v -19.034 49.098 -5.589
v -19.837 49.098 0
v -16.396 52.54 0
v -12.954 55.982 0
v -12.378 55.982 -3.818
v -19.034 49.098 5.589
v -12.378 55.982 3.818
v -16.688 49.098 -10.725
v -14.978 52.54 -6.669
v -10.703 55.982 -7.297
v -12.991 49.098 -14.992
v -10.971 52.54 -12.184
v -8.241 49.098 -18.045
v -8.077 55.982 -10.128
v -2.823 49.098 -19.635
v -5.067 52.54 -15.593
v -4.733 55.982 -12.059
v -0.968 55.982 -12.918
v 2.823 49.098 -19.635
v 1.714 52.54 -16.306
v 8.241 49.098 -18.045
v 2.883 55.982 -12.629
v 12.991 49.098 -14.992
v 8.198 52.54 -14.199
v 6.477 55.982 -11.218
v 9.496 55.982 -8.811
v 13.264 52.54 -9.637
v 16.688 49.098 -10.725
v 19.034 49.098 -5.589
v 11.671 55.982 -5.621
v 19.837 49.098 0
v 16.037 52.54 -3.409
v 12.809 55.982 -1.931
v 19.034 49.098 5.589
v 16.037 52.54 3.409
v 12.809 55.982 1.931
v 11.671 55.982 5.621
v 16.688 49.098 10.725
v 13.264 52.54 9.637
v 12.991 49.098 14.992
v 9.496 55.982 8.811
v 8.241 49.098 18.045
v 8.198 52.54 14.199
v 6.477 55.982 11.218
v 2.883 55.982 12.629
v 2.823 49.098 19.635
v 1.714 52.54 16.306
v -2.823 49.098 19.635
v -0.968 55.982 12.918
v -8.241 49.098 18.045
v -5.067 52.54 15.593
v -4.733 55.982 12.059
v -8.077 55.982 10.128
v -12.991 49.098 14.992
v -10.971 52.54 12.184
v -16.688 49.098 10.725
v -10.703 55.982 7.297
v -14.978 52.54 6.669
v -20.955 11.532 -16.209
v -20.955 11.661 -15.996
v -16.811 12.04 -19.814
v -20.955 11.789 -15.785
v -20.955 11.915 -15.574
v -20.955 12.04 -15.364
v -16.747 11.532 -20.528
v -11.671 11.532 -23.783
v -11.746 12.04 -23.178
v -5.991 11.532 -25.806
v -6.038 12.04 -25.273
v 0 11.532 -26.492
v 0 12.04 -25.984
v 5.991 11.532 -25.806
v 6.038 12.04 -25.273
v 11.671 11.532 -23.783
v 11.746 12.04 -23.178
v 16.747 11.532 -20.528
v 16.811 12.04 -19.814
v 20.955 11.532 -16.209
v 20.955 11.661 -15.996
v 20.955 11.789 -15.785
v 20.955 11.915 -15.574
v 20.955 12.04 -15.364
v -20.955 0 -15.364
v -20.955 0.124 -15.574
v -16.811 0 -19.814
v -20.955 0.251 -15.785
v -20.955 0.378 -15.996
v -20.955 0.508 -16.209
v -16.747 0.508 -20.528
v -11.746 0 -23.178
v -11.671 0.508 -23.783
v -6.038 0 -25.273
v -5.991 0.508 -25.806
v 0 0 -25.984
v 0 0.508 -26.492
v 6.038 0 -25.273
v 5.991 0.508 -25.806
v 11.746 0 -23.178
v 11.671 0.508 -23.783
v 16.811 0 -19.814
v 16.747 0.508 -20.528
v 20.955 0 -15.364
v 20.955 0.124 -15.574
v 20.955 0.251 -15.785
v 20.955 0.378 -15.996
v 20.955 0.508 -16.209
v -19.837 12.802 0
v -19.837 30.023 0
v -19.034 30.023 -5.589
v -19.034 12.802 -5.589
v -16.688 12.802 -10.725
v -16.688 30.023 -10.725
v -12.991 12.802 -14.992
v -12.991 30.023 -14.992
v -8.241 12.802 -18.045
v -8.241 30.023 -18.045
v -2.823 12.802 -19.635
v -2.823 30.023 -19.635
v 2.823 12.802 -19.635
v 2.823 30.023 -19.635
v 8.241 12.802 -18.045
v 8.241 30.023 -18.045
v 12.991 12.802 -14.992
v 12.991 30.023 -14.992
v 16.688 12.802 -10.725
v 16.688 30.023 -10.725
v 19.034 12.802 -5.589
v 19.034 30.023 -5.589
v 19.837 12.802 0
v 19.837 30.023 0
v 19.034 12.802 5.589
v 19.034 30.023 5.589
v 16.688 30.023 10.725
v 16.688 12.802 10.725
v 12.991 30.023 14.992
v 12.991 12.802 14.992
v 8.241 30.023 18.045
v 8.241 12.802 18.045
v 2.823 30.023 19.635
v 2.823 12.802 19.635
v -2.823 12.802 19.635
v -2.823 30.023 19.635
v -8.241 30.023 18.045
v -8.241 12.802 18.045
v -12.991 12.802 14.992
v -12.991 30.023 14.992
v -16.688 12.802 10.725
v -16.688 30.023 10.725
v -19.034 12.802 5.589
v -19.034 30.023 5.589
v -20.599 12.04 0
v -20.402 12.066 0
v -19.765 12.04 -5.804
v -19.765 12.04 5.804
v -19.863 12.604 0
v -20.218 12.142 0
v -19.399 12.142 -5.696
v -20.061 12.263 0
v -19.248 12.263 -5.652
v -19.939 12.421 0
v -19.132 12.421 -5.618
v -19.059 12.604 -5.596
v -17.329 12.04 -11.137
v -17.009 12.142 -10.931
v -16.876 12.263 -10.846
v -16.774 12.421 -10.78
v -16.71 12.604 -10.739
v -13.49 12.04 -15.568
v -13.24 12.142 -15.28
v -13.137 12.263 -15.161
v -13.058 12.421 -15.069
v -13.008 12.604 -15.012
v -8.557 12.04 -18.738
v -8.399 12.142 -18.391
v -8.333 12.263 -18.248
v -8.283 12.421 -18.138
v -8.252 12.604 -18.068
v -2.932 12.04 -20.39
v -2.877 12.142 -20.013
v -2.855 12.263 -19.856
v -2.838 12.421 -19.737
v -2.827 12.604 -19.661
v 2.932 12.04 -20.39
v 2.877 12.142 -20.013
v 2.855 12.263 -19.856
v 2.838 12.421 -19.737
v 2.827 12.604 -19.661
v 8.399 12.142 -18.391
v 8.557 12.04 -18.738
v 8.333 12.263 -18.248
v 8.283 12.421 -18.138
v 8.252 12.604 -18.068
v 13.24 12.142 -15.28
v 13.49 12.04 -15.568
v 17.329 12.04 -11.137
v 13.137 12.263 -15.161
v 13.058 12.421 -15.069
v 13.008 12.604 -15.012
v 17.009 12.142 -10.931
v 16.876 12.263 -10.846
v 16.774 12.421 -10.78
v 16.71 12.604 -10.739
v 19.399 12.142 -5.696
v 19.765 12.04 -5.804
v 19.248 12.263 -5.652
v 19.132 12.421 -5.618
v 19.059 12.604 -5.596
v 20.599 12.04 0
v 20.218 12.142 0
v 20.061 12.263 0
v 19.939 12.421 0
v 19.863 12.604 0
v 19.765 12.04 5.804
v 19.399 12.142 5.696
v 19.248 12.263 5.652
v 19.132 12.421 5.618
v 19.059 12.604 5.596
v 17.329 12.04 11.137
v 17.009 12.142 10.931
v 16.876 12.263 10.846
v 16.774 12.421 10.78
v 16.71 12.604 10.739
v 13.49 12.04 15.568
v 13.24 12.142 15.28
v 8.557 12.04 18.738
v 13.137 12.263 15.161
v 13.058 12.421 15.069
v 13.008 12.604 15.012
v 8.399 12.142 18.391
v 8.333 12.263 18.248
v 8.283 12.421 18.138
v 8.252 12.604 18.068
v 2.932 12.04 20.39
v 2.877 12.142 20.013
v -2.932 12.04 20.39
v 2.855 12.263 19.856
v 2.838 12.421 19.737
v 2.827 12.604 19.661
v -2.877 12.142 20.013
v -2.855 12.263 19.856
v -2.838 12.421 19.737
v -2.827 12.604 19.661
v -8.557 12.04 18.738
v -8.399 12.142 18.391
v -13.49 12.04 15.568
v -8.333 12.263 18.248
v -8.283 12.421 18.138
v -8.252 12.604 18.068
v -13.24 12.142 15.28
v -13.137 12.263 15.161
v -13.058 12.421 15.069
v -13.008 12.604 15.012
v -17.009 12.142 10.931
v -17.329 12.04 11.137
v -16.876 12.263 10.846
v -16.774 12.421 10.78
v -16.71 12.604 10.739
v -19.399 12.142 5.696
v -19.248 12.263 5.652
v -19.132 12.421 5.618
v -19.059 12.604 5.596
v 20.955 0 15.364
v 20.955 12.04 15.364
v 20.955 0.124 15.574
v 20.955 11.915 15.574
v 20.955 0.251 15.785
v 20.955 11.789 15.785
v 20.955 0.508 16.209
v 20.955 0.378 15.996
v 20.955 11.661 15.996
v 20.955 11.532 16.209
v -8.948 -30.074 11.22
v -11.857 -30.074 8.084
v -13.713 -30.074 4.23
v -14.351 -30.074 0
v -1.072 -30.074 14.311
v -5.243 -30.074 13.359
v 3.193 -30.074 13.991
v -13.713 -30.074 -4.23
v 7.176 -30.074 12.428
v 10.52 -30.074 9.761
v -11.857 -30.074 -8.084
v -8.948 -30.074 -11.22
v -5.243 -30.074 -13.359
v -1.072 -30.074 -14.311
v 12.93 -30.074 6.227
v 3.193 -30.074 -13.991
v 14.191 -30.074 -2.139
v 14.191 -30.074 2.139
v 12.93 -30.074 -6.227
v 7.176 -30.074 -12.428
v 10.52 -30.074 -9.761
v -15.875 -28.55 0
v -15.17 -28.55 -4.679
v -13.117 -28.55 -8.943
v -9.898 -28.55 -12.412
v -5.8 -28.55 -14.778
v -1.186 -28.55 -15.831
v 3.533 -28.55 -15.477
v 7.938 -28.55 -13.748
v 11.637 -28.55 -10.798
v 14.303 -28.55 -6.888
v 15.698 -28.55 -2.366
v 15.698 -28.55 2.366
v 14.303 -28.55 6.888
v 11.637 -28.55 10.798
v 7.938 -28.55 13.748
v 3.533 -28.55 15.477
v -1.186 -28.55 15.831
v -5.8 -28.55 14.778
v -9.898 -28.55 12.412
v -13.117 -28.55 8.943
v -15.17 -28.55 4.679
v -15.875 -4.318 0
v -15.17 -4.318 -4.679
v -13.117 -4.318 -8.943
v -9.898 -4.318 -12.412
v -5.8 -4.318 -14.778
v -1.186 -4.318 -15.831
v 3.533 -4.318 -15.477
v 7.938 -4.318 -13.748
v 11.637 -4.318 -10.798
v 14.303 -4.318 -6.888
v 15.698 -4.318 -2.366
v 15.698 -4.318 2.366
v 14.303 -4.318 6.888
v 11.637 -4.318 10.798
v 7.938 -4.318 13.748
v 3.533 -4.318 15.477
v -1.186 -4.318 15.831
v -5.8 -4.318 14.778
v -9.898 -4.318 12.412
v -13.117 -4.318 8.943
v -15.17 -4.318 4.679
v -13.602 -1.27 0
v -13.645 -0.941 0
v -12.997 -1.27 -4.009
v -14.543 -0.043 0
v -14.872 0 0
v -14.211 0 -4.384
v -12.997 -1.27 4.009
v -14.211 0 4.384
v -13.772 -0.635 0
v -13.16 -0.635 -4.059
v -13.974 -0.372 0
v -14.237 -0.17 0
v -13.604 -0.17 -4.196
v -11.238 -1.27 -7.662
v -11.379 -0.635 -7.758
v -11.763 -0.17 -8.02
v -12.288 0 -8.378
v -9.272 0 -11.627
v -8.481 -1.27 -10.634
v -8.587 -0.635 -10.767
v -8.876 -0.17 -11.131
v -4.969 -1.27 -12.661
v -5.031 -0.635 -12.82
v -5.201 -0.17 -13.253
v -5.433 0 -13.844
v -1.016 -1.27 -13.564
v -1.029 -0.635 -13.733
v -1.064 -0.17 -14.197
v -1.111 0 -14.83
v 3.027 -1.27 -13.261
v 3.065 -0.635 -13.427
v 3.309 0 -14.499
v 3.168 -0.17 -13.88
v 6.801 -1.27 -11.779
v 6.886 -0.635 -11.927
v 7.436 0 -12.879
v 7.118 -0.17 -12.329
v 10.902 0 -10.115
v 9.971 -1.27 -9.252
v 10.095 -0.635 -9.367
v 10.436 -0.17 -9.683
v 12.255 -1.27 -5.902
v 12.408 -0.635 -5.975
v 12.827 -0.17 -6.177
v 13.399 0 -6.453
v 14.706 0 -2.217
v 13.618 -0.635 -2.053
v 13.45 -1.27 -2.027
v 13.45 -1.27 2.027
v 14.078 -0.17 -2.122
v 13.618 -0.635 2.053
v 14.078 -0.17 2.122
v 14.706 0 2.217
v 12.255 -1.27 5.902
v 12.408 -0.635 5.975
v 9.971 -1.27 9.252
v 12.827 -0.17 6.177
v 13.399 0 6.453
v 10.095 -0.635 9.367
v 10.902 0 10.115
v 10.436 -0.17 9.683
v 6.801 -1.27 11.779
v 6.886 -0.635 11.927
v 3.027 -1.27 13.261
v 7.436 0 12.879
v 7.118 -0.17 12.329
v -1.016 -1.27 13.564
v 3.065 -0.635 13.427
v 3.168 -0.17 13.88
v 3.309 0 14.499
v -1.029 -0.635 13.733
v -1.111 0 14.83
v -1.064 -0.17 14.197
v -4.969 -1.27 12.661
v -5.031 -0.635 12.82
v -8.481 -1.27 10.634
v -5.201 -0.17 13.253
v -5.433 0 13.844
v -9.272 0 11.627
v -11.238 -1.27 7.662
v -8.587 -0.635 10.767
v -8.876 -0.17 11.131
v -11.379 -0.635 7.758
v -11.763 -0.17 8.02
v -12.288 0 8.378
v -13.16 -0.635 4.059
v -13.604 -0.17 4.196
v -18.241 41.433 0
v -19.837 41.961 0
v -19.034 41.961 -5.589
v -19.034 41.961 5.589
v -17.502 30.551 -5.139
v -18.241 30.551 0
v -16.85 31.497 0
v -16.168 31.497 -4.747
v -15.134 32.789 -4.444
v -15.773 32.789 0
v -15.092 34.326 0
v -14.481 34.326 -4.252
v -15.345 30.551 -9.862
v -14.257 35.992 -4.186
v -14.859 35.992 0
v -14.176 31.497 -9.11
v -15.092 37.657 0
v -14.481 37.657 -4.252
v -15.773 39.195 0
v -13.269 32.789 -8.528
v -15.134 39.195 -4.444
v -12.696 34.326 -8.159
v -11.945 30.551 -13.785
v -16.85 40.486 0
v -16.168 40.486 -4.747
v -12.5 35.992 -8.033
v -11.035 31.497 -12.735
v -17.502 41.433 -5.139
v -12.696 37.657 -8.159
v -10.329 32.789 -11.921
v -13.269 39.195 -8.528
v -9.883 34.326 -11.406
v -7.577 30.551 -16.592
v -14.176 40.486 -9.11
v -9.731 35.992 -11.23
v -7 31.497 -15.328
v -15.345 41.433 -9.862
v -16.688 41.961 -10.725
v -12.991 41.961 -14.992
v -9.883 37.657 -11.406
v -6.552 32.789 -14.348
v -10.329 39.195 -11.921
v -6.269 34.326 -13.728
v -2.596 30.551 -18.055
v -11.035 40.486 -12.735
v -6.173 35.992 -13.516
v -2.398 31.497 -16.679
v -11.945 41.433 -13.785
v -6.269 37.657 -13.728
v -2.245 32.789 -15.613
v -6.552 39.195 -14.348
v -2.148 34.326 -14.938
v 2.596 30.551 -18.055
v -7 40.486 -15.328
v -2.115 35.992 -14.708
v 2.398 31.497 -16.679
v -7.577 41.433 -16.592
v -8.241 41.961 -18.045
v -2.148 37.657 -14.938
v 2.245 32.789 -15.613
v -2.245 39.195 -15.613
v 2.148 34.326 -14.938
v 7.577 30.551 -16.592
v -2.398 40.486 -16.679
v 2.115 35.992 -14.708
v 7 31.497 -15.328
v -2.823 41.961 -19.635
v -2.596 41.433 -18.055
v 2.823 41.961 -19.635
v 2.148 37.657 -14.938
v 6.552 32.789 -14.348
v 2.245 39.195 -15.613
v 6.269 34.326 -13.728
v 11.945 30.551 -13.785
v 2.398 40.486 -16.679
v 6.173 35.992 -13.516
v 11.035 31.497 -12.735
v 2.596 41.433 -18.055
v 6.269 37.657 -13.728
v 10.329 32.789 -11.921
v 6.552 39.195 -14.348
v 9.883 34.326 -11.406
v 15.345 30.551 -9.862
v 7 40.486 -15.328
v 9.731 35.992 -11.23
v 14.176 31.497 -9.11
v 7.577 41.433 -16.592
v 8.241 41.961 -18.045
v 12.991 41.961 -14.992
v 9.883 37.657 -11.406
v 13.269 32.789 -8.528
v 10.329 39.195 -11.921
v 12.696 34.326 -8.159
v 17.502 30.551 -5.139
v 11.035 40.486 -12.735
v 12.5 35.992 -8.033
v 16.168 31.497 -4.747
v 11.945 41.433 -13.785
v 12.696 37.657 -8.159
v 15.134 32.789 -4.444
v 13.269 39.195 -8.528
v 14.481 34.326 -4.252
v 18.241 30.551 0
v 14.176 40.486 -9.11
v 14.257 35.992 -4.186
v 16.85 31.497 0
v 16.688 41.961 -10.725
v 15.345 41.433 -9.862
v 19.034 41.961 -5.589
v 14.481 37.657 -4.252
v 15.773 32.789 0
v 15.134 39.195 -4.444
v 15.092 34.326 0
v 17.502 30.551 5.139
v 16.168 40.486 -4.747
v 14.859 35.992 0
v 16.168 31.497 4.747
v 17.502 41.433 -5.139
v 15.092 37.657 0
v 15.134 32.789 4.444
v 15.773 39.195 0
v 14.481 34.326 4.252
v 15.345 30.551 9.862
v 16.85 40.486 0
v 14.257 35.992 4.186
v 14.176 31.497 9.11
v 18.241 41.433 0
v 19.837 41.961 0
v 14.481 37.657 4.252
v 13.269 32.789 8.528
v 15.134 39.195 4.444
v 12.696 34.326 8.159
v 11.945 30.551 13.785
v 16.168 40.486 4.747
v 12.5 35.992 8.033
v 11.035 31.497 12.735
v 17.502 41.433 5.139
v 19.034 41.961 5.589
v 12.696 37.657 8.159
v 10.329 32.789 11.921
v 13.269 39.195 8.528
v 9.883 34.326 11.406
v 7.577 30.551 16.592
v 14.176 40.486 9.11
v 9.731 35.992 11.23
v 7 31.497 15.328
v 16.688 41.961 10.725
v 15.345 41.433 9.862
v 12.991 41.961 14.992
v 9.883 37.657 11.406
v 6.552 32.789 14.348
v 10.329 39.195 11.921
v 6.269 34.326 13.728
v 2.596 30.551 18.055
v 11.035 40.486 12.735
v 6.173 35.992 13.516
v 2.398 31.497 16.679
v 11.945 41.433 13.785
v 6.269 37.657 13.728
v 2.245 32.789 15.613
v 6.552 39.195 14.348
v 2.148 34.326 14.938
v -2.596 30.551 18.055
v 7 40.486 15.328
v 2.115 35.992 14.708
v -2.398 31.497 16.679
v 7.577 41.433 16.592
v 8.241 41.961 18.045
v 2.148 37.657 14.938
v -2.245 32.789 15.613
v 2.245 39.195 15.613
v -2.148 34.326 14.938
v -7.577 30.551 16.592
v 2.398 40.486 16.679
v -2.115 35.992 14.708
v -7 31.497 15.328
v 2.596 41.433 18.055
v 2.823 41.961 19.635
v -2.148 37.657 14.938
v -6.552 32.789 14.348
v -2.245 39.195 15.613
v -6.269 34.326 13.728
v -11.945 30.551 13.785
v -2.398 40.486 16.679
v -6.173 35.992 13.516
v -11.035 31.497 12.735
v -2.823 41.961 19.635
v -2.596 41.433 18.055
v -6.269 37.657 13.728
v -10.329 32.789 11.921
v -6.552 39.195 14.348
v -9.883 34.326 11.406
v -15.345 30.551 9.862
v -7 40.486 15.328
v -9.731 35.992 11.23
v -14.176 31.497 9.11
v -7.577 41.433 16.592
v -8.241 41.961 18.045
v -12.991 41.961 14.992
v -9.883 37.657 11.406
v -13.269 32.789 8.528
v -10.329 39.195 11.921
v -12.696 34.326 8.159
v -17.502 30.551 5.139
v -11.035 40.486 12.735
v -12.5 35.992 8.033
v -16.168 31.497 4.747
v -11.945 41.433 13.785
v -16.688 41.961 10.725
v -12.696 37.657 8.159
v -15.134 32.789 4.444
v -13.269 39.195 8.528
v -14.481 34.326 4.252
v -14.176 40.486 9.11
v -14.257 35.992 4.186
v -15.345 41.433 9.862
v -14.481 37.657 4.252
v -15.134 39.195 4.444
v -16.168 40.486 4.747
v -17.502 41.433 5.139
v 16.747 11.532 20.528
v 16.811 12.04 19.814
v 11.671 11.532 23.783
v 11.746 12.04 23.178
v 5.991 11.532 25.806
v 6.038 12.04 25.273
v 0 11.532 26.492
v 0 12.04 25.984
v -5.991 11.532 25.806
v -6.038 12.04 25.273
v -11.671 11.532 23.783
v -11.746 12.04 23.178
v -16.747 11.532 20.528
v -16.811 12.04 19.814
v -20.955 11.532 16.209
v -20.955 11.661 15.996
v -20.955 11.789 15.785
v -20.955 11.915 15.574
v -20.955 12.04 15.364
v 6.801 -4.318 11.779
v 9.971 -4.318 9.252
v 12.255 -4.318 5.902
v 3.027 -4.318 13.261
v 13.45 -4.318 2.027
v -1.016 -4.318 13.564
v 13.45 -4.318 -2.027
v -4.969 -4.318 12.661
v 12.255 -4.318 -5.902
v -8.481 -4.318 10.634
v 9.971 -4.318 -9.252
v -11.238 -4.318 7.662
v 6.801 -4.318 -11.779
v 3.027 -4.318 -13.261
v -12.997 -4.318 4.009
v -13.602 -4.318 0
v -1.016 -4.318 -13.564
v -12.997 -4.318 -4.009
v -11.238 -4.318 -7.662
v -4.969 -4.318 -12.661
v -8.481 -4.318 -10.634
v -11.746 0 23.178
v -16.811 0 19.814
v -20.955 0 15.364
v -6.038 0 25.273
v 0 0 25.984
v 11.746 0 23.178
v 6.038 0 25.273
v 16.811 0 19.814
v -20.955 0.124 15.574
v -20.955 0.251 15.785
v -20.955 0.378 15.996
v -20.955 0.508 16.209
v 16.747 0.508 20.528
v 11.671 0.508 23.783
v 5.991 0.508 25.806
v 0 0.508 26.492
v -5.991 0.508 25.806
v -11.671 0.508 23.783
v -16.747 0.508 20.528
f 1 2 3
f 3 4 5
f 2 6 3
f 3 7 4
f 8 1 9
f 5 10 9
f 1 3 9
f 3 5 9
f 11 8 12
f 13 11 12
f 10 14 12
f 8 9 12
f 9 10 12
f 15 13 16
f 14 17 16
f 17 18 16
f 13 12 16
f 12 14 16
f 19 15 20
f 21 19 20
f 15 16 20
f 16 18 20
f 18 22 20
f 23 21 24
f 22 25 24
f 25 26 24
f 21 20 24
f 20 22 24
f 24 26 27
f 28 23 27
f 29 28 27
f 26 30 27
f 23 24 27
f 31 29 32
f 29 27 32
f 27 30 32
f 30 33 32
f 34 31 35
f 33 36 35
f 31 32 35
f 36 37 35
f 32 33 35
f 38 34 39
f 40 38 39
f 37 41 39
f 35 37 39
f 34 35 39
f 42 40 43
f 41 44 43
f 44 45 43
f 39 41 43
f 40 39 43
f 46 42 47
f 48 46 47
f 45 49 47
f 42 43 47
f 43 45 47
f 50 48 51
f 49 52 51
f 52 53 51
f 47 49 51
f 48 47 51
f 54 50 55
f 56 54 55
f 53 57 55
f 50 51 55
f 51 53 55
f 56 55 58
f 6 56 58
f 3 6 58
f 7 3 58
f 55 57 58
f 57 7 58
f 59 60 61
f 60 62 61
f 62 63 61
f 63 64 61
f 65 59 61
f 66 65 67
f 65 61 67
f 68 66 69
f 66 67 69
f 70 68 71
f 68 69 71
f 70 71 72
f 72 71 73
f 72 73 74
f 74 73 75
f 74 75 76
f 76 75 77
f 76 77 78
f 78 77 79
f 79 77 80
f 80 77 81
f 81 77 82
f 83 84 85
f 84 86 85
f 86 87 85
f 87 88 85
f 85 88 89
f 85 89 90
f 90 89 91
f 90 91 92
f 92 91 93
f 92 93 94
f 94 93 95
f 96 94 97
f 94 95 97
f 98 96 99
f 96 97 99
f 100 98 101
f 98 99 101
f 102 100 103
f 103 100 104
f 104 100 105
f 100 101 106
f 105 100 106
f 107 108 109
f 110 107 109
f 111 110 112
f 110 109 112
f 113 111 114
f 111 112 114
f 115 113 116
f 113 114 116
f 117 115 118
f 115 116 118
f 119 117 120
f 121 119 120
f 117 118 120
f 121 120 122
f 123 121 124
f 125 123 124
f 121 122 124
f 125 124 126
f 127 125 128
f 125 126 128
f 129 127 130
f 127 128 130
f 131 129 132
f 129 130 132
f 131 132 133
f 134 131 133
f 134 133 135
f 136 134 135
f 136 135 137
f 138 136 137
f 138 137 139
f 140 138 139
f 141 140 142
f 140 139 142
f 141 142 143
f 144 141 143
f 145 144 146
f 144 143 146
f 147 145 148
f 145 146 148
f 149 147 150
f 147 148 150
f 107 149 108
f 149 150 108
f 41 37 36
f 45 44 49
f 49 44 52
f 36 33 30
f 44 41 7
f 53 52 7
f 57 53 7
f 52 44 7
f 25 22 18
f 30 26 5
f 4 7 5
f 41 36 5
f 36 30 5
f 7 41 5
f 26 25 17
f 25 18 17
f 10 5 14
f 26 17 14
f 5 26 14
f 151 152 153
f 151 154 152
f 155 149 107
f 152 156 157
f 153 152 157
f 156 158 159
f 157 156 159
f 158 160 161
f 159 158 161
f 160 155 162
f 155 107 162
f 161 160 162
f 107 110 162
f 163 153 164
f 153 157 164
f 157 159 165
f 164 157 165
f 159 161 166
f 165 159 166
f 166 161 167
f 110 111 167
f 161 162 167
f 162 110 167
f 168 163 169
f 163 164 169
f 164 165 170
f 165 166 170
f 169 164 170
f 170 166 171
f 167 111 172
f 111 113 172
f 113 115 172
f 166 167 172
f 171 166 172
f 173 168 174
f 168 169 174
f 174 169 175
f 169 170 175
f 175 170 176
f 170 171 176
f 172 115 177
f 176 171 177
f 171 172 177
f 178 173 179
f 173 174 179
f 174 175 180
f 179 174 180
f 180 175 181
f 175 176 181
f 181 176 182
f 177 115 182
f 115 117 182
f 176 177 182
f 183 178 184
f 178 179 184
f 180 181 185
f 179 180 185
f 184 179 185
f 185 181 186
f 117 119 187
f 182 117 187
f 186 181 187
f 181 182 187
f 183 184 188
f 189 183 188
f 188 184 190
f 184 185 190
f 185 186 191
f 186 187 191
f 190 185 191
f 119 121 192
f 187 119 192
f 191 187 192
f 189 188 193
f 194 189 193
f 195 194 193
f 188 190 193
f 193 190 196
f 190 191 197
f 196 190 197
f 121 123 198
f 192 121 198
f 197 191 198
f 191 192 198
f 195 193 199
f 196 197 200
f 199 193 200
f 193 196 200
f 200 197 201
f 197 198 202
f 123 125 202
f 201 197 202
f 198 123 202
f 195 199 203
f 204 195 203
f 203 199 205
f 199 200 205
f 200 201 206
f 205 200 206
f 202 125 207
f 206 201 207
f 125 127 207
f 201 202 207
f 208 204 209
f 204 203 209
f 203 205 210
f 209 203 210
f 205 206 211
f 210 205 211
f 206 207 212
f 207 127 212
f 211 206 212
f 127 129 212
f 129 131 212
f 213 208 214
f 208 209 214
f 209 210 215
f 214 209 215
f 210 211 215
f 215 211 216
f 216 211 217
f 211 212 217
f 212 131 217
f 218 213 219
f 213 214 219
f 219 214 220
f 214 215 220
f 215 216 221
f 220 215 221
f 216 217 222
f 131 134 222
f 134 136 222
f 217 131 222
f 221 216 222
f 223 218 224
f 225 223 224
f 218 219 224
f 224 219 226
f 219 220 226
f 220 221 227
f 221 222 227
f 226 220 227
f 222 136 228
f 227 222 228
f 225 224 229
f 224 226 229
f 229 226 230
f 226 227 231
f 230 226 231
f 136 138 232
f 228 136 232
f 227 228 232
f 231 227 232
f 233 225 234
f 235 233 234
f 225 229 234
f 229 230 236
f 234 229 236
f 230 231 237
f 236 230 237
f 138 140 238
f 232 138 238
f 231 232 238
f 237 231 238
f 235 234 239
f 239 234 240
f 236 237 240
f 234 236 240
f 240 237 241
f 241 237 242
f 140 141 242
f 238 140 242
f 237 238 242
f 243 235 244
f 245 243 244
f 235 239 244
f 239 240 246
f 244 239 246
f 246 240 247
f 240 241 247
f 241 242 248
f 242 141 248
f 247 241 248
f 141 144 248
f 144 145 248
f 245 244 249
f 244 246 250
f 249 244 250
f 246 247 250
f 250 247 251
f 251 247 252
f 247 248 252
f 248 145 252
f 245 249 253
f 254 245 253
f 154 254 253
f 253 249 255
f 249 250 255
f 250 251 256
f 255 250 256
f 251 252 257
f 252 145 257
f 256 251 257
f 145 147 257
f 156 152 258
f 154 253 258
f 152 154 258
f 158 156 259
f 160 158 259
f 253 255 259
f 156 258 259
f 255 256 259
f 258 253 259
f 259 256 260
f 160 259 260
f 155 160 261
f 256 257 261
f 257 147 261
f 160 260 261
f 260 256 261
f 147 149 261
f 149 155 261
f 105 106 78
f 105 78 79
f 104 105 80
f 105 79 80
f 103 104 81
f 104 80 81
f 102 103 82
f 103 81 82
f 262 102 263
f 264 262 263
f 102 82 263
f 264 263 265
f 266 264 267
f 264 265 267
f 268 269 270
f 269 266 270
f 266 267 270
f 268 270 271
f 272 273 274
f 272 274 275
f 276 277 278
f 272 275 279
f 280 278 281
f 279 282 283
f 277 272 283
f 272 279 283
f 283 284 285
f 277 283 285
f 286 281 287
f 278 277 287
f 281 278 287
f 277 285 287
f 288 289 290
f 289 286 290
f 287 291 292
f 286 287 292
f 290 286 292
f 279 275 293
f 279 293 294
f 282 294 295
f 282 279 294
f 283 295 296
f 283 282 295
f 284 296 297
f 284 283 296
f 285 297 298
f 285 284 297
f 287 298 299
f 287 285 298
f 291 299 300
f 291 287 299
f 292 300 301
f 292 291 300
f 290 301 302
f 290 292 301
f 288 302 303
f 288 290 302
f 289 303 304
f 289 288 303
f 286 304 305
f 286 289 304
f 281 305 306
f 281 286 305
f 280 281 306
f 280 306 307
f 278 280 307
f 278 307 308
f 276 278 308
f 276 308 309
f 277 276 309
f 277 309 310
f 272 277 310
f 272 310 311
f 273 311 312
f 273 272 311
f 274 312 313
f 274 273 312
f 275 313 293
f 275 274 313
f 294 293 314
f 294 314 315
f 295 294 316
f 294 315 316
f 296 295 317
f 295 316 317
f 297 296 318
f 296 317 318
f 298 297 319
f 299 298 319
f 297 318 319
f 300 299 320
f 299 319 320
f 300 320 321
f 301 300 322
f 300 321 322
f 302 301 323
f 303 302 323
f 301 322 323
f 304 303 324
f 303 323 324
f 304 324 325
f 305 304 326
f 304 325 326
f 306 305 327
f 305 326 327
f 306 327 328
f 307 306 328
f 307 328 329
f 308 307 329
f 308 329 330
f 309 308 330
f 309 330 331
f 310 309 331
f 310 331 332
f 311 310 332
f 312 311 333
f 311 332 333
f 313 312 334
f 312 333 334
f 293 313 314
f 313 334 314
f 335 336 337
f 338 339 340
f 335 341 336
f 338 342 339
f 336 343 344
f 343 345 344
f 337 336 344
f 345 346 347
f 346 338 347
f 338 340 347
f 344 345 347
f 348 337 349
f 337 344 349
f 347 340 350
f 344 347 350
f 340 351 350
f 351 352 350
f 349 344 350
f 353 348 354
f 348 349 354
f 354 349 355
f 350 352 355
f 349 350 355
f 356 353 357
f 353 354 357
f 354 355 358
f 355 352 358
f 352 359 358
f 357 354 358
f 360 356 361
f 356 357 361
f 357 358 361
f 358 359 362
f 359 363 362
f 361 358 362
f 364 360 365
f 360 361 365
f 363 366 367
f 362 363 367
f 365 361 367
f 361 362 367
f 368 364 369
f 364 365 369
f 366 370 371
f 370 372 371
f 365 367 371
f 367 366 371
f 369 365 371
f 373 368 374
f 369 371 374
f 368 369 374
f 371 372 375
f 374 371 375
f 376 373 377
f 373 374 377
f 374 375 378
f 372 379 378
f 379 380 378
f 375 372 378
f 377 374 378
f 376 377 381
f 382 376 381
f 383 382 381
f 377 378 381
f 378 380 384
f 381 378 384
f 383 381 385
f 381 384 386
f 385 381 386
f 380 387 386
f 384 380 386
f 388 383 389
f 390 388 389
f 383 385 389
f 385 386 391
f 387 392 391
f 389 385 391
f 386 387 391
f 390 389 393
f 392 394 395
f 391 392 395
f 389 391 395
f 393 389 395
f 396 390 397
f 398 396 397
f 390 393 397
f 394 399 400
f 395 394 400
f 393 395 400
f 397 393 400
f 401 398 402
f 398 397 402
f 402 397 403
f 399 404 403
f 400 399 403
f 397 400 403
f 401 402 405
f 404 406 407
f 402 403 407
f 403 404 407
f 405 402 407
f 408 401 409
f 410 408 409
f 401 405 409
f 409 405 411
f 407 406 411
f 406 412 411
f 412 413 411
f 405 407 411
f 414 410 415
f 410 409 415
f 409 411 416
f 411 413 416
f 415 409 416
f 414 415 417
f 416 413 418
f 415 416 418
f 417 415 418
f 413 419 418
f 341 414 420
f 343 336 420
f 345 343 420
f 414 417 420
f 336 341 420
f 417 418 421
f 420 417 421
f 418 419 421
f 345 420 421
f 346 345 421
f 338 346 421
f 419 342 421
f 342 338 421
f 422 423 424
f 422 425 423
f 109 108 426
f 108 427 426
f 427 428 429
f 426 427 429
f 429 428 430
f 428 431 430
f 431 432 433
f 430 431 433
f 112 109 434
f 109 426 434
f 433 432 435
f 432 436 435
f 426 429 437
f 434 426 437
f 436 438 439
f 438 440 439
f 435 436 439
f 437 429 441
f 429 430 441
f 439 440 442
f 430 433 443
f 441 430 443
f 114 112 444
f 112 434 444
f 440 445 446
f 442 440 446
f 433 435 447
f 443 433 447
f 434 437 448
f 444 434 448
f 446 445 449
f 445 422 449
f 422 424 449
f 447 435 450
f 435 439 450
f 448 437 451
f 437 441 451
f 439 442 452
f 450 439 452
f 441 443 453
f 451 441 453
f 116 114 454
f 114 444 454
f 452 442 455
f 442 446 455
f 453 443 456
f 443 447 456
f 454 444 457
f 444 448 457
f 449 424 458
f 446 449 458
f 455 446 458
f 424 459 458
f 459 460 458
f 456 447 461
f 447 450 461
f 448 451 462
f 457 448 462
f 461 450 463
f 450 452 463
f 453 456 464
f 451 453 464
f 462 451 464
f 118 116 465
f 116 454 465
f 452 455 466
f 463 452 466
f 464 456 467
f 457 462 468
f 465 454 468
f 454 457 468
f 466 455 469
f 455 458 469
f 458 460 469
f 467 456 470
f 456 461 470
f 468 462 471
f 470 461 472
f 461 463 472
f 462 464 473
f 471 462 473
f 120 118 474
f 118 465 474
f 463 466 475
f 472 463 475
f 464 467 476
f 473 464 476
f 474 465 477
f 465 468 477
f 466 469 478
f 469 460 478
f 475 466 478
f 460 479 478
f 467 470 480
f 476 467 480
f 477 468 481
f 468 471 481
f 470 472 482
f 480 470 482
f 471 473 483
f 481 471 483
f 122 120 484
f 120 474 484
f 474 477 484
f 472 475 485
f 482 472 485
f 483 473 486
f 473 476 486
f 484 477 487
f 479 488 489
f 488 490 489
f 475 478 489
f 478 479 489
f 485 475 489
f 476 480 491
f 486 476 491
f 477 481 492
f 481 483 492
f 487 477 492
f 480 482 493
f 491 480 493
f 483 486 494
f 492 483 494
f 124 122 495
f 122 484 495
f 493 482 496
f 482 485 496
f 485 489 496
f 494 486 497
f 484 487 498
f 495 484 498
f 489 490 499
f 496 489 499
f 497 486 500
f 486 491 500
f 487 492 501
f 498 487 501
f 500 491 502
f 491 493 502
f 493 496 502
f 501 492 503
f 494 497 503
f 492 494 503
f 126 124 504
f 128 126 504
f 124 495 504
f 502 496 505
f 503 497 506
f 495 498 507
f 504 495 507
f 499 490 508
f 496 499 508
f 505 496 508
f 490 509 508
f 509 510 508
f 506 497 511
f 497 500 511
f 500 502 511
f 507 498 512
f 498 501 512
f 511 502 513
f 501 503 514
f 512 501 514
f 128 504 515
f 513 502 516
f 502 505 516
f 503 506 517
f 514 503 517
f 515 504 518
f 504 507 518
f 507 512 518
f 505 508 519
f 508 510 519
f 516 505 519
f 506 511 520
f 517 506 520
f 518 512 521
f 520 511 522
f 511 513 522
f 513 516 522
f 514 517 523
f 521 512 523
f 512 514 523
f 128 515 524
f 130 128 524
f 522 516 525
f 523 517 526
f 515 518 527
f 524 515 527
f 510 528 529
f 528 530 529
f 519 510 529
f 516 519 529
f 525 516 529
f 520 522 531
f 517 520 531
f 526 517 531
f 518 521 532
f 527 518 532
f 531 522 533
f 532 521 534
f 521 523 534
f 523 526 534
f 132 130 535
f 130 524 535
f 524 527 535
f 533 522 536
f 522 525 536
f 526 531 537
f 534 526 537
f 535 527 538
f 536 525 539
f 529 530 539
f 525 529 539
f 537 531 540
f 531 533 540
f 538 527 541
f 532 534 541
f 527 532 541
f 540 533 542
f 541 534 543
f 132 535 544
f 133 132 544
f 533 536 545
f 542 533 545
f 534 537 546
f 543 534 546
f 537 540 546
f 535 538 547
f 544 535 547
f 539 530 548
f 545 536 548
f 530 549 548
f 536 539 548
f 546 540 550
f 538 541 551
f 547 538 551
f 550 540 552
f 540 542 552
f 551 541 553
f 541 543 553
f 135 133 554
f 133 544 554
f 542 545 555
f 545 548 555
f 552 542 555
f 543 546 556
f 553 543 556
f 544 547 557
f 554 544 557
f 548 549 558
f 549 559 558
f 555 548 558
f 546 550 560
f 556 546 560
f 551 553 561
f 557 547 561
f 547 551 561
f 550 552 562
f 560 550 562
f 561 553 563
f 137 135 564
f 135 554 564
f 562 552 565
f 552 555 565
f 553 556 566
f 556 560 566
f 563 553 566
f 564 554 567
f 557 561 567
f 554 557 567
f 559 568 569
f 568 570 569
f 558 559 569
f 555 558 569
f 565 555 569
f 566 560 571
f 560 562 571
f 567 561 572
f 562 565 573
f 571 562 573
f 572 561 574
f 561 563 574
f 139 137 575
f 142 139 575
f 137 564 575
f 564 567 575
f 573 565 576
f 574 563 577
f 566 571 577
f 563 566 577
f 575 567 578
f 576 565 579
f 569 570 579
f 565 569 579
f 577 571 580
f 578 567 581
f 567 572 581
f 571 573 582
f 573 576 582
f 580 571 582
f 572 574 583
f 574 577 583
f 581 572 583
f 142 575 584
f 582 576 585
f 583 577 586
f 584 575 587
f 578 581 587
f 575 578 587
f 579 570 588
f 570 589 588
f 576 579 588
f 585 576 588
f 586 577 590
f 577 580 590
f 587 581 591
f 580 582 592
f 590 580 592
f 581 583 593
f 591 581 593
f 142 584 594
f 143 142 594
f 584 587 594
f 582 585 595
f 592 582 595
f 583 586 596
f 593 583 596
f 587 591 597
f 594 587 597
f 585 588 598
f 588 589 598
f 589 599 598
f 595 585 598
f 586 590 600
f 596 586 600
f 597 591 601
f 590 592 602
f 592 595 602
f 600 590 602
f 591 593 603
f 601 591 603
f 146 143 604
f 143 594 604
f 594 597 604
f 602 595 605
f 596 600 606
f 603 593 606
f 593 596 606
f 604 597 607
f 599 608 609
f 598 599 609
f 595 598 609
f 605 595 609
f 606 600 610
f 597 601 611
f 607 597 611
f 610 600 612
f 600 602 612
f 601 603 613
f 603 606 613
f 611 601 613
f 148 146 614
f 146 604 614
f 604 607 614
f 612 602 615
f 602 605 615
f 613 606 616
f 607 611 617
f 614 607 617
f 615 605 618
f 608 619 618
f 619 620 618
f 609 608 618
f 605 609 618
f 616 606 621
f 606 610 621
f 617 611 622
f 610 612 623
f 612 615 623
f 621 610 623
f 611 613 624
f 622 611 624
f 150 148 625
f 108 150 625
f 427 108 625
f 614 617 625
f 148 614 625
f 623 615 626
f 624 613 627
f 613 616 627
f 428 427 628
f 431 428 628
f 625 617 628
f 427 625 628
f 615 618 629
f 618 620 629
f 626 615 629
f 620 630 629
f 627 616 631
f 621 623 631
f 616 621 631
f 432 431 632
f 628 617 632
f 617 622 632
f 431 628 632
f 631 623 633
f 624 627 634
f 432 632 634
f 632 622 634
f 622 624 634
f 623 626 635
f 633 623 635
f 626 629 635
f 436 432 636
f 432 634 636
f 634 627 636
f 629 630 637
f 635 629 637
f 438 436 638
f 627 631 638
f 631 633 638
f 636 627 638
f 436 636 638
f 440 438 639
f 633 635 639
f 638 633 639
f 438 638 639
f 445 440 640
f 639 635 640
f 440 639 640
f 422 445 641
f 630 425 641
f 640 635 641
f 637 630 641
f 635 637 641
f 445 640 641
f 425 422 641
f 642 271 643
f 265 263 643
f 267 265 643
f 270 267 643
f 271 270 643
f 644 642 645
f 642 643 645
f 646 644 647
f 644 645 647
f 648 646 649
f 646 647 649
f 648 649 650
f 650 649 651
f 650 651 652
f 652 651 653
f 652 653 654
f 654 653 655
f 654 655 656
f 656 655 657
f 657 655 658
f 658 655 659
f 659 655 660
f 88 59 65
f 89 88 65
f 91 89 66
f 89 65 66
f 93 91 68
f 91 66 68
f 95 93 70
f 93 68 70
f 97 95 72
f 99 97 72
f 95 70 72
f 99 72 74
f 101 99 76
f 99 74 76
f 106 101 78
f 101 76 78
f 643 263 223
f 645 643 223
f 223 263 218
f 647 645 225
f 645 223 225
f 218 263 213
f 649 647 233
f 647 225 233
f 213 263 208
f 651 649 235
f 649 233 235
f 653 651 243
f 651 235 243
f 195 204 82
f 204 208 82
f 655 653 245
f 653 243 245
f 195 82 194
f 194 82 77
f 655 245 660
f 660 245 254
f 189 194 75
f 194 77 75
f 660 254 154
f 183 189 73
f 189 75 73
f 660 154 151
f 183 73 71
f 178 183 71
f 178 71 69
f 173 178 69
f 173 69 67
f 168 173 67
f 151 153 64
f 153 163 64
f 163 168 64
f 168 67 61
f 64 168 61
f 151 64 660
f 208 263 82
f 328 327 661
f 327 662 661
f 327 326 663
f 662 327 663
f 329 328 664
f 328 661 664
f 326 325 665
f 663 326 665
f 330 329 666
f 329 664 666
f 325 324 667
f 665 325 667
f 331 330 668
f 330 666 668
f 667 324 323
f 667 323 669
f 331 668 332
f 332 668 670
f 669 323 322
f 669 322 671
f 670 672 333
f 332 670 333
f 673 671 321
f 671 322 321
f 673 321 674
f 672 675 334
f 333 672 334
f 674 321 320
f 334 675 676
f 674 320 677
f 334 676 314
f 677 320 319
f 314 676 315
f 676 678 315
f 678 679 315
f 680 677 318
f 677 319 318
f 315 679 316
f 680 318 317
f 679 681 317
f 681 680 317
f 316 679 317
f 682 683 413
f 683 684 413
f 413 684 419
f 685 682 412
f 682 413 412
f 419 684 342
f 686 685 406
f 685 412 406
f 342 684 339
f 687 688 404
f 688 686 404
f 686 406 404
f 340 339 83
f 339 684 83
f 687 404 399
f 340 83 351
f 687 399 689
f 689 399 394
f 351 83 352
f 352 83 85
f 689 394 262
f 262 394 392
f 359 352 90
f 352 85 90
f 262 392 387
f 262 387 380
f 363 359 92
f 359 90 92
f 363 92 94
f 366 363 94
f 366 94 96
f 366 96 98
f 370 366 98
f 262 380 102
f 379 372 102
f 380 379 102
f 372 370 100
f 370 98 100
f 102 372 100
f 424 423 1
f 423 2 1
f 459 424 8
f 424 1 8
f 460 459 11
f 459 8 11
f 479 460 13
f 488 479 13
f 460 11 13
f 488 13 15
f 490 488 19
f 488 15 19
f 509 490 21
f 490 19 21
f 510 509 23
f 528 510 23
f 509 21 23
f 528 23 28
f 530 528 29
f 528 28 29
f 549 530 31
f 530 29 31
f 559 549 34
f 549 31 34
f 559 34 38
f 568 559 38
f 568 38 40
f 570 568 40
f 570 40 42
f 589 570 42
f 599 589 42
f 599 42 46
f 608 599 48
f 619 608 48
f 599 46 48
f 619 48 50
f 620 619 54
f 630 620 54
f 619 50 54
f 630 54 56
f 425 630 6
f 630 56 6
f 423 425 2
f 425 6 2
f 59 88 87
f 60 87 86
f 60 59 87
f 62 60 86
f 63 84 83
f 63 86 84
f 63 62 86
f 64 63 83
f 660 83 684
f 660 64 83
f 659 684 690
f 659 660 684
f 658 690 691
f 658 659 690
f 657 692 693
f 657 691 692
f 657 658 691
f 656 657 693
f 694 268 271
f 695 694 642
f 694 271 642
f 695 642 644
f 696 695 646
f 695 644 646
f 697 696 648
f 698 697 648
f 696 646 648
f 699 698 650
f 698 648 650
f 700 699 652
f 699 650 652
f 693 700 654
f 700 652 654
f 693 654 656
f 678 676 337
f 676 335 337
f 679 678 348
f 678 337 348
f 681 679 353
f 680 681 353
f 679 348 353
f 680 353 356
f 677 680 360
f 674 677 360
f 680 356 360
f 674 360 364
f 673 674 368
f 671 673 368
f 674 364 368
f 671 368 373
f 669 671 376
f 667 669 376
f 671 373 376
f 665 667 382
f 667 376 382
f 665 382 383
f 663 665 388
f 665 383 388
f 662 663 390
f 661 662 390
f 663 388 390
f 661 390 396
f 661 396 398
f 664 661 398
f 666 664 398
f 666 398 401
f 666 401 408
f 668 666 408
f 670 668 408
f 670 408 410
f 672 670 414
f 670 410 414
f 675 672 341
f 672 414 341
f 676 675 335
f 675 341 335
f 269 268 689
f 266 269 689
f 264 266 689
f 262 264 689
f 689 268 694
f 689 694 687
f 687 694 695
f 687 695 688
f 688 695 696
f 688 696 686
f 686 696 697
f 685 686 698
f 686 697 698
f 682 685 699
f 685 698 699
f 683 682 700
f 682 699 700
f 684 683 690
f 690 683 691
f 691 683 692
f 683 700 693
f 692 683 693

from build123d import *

# Parameters (mm, degrees)
CHAMFER1_SIZE      = 0.508
CHAMFER2_SIZE      = 1.524
CUT_EXTRUDE1_DEPTH = 43.1132
FILLET1_R          = 0.762


with BuildPart() as part:
    # Sketch1 → Revolve1 (revolve)
    with BuildSketch(Plane.XY):
        with BuildLine():
            Line((0, 55.9816), (0, -30.0736))
            Line((0, -30.0736), (-15.875, -30.0736))
            Line((-15.875, -30.0736), (-15.875, -4.318))
            Line((-15.875, -4.318), (-13.6017, -4.318))
            Line((-13.6017, -4.318), (-13.6017, -1.27))
            ThreePointArc((-13.6017, -1.27), (-13.973674388, -0.371974388), (-14.8717, 0))
            Line((-14.8717, 0), (-26.4922, 0))
            Line((-26.4922, 0), (-26.4922, 12.0396))
            Line((-26.4922, 12.0396), (-19.8374, 12.0396))
            Line((-19.8374, 12.0396), (-19.8374, 30.0228))
            ThreePointArc((-19.8374, 30.0228), (-14.859, 35.9918), (-19.8374, 41.9608))
            Line((-19.8374, 41.9608), (-19.8374, 49.0982))
            Line((-19.8374, 49.0982), (-12.954, 55.9816))
            Line((-12.954, 55.9816), (0, 55.9816))
        make_face()
    revolve(axis=Axis((0, -30.0736, 0), (0, -1, 0)))

    # Chamfer1
    chamfer1_edges = [part.edges().sort_by_distance(p)[0] for p in [
        (26.4922, 12.0396, 0),
        (26.4922, 0, 0),
    ]]
    chamfer(chamfer1_edges, length=CHAMFER1_SIZE)

    # Chamfer2
    chamfer2_edges = [part.edges().sort_by_distance(p)[0] for p in [
        (15.875, -30.0736, 0),
    ]]
    chamfer(chamfer2_edges, length=CHAMFER2_SIZE)

    # Sketch2 → Cut-Extrude1 (cut, through all)
    with BuildSketch(Plane(origin=(0, 12.0396, 0), x_dir=(1, 0, 0), z_dir=(0, 1, 0))):
        with BuildLine():
            Line((-20.955, 16.208782676), (-20.955, -16.208782676))
            ThreePointArc((-20.955, -16.208782676), (-26.4922, 0), (-20.955, 16.208782676))
        make_face()
        with BuildLine():
            Line((20.955, 16.208782676), (20.955, -16.208782676))
            ThreePointArc((20.955, -16.208782676), (26.4922, 0), (20.955, 16.208782676))
        make_face()
    extrude(amount=-CUT_EXTRUDE1_DEPTH, mode=Mode.SUBTRACT)

    # Fillet1
    fillet1_edges = [part.edges().sort_by_distance(p)[0] for p in [
        (19.8374, 12.0396, 0),
    ]]
    fillet(fillet1_edges, radius=FILLET1_R)


solid = part.part
